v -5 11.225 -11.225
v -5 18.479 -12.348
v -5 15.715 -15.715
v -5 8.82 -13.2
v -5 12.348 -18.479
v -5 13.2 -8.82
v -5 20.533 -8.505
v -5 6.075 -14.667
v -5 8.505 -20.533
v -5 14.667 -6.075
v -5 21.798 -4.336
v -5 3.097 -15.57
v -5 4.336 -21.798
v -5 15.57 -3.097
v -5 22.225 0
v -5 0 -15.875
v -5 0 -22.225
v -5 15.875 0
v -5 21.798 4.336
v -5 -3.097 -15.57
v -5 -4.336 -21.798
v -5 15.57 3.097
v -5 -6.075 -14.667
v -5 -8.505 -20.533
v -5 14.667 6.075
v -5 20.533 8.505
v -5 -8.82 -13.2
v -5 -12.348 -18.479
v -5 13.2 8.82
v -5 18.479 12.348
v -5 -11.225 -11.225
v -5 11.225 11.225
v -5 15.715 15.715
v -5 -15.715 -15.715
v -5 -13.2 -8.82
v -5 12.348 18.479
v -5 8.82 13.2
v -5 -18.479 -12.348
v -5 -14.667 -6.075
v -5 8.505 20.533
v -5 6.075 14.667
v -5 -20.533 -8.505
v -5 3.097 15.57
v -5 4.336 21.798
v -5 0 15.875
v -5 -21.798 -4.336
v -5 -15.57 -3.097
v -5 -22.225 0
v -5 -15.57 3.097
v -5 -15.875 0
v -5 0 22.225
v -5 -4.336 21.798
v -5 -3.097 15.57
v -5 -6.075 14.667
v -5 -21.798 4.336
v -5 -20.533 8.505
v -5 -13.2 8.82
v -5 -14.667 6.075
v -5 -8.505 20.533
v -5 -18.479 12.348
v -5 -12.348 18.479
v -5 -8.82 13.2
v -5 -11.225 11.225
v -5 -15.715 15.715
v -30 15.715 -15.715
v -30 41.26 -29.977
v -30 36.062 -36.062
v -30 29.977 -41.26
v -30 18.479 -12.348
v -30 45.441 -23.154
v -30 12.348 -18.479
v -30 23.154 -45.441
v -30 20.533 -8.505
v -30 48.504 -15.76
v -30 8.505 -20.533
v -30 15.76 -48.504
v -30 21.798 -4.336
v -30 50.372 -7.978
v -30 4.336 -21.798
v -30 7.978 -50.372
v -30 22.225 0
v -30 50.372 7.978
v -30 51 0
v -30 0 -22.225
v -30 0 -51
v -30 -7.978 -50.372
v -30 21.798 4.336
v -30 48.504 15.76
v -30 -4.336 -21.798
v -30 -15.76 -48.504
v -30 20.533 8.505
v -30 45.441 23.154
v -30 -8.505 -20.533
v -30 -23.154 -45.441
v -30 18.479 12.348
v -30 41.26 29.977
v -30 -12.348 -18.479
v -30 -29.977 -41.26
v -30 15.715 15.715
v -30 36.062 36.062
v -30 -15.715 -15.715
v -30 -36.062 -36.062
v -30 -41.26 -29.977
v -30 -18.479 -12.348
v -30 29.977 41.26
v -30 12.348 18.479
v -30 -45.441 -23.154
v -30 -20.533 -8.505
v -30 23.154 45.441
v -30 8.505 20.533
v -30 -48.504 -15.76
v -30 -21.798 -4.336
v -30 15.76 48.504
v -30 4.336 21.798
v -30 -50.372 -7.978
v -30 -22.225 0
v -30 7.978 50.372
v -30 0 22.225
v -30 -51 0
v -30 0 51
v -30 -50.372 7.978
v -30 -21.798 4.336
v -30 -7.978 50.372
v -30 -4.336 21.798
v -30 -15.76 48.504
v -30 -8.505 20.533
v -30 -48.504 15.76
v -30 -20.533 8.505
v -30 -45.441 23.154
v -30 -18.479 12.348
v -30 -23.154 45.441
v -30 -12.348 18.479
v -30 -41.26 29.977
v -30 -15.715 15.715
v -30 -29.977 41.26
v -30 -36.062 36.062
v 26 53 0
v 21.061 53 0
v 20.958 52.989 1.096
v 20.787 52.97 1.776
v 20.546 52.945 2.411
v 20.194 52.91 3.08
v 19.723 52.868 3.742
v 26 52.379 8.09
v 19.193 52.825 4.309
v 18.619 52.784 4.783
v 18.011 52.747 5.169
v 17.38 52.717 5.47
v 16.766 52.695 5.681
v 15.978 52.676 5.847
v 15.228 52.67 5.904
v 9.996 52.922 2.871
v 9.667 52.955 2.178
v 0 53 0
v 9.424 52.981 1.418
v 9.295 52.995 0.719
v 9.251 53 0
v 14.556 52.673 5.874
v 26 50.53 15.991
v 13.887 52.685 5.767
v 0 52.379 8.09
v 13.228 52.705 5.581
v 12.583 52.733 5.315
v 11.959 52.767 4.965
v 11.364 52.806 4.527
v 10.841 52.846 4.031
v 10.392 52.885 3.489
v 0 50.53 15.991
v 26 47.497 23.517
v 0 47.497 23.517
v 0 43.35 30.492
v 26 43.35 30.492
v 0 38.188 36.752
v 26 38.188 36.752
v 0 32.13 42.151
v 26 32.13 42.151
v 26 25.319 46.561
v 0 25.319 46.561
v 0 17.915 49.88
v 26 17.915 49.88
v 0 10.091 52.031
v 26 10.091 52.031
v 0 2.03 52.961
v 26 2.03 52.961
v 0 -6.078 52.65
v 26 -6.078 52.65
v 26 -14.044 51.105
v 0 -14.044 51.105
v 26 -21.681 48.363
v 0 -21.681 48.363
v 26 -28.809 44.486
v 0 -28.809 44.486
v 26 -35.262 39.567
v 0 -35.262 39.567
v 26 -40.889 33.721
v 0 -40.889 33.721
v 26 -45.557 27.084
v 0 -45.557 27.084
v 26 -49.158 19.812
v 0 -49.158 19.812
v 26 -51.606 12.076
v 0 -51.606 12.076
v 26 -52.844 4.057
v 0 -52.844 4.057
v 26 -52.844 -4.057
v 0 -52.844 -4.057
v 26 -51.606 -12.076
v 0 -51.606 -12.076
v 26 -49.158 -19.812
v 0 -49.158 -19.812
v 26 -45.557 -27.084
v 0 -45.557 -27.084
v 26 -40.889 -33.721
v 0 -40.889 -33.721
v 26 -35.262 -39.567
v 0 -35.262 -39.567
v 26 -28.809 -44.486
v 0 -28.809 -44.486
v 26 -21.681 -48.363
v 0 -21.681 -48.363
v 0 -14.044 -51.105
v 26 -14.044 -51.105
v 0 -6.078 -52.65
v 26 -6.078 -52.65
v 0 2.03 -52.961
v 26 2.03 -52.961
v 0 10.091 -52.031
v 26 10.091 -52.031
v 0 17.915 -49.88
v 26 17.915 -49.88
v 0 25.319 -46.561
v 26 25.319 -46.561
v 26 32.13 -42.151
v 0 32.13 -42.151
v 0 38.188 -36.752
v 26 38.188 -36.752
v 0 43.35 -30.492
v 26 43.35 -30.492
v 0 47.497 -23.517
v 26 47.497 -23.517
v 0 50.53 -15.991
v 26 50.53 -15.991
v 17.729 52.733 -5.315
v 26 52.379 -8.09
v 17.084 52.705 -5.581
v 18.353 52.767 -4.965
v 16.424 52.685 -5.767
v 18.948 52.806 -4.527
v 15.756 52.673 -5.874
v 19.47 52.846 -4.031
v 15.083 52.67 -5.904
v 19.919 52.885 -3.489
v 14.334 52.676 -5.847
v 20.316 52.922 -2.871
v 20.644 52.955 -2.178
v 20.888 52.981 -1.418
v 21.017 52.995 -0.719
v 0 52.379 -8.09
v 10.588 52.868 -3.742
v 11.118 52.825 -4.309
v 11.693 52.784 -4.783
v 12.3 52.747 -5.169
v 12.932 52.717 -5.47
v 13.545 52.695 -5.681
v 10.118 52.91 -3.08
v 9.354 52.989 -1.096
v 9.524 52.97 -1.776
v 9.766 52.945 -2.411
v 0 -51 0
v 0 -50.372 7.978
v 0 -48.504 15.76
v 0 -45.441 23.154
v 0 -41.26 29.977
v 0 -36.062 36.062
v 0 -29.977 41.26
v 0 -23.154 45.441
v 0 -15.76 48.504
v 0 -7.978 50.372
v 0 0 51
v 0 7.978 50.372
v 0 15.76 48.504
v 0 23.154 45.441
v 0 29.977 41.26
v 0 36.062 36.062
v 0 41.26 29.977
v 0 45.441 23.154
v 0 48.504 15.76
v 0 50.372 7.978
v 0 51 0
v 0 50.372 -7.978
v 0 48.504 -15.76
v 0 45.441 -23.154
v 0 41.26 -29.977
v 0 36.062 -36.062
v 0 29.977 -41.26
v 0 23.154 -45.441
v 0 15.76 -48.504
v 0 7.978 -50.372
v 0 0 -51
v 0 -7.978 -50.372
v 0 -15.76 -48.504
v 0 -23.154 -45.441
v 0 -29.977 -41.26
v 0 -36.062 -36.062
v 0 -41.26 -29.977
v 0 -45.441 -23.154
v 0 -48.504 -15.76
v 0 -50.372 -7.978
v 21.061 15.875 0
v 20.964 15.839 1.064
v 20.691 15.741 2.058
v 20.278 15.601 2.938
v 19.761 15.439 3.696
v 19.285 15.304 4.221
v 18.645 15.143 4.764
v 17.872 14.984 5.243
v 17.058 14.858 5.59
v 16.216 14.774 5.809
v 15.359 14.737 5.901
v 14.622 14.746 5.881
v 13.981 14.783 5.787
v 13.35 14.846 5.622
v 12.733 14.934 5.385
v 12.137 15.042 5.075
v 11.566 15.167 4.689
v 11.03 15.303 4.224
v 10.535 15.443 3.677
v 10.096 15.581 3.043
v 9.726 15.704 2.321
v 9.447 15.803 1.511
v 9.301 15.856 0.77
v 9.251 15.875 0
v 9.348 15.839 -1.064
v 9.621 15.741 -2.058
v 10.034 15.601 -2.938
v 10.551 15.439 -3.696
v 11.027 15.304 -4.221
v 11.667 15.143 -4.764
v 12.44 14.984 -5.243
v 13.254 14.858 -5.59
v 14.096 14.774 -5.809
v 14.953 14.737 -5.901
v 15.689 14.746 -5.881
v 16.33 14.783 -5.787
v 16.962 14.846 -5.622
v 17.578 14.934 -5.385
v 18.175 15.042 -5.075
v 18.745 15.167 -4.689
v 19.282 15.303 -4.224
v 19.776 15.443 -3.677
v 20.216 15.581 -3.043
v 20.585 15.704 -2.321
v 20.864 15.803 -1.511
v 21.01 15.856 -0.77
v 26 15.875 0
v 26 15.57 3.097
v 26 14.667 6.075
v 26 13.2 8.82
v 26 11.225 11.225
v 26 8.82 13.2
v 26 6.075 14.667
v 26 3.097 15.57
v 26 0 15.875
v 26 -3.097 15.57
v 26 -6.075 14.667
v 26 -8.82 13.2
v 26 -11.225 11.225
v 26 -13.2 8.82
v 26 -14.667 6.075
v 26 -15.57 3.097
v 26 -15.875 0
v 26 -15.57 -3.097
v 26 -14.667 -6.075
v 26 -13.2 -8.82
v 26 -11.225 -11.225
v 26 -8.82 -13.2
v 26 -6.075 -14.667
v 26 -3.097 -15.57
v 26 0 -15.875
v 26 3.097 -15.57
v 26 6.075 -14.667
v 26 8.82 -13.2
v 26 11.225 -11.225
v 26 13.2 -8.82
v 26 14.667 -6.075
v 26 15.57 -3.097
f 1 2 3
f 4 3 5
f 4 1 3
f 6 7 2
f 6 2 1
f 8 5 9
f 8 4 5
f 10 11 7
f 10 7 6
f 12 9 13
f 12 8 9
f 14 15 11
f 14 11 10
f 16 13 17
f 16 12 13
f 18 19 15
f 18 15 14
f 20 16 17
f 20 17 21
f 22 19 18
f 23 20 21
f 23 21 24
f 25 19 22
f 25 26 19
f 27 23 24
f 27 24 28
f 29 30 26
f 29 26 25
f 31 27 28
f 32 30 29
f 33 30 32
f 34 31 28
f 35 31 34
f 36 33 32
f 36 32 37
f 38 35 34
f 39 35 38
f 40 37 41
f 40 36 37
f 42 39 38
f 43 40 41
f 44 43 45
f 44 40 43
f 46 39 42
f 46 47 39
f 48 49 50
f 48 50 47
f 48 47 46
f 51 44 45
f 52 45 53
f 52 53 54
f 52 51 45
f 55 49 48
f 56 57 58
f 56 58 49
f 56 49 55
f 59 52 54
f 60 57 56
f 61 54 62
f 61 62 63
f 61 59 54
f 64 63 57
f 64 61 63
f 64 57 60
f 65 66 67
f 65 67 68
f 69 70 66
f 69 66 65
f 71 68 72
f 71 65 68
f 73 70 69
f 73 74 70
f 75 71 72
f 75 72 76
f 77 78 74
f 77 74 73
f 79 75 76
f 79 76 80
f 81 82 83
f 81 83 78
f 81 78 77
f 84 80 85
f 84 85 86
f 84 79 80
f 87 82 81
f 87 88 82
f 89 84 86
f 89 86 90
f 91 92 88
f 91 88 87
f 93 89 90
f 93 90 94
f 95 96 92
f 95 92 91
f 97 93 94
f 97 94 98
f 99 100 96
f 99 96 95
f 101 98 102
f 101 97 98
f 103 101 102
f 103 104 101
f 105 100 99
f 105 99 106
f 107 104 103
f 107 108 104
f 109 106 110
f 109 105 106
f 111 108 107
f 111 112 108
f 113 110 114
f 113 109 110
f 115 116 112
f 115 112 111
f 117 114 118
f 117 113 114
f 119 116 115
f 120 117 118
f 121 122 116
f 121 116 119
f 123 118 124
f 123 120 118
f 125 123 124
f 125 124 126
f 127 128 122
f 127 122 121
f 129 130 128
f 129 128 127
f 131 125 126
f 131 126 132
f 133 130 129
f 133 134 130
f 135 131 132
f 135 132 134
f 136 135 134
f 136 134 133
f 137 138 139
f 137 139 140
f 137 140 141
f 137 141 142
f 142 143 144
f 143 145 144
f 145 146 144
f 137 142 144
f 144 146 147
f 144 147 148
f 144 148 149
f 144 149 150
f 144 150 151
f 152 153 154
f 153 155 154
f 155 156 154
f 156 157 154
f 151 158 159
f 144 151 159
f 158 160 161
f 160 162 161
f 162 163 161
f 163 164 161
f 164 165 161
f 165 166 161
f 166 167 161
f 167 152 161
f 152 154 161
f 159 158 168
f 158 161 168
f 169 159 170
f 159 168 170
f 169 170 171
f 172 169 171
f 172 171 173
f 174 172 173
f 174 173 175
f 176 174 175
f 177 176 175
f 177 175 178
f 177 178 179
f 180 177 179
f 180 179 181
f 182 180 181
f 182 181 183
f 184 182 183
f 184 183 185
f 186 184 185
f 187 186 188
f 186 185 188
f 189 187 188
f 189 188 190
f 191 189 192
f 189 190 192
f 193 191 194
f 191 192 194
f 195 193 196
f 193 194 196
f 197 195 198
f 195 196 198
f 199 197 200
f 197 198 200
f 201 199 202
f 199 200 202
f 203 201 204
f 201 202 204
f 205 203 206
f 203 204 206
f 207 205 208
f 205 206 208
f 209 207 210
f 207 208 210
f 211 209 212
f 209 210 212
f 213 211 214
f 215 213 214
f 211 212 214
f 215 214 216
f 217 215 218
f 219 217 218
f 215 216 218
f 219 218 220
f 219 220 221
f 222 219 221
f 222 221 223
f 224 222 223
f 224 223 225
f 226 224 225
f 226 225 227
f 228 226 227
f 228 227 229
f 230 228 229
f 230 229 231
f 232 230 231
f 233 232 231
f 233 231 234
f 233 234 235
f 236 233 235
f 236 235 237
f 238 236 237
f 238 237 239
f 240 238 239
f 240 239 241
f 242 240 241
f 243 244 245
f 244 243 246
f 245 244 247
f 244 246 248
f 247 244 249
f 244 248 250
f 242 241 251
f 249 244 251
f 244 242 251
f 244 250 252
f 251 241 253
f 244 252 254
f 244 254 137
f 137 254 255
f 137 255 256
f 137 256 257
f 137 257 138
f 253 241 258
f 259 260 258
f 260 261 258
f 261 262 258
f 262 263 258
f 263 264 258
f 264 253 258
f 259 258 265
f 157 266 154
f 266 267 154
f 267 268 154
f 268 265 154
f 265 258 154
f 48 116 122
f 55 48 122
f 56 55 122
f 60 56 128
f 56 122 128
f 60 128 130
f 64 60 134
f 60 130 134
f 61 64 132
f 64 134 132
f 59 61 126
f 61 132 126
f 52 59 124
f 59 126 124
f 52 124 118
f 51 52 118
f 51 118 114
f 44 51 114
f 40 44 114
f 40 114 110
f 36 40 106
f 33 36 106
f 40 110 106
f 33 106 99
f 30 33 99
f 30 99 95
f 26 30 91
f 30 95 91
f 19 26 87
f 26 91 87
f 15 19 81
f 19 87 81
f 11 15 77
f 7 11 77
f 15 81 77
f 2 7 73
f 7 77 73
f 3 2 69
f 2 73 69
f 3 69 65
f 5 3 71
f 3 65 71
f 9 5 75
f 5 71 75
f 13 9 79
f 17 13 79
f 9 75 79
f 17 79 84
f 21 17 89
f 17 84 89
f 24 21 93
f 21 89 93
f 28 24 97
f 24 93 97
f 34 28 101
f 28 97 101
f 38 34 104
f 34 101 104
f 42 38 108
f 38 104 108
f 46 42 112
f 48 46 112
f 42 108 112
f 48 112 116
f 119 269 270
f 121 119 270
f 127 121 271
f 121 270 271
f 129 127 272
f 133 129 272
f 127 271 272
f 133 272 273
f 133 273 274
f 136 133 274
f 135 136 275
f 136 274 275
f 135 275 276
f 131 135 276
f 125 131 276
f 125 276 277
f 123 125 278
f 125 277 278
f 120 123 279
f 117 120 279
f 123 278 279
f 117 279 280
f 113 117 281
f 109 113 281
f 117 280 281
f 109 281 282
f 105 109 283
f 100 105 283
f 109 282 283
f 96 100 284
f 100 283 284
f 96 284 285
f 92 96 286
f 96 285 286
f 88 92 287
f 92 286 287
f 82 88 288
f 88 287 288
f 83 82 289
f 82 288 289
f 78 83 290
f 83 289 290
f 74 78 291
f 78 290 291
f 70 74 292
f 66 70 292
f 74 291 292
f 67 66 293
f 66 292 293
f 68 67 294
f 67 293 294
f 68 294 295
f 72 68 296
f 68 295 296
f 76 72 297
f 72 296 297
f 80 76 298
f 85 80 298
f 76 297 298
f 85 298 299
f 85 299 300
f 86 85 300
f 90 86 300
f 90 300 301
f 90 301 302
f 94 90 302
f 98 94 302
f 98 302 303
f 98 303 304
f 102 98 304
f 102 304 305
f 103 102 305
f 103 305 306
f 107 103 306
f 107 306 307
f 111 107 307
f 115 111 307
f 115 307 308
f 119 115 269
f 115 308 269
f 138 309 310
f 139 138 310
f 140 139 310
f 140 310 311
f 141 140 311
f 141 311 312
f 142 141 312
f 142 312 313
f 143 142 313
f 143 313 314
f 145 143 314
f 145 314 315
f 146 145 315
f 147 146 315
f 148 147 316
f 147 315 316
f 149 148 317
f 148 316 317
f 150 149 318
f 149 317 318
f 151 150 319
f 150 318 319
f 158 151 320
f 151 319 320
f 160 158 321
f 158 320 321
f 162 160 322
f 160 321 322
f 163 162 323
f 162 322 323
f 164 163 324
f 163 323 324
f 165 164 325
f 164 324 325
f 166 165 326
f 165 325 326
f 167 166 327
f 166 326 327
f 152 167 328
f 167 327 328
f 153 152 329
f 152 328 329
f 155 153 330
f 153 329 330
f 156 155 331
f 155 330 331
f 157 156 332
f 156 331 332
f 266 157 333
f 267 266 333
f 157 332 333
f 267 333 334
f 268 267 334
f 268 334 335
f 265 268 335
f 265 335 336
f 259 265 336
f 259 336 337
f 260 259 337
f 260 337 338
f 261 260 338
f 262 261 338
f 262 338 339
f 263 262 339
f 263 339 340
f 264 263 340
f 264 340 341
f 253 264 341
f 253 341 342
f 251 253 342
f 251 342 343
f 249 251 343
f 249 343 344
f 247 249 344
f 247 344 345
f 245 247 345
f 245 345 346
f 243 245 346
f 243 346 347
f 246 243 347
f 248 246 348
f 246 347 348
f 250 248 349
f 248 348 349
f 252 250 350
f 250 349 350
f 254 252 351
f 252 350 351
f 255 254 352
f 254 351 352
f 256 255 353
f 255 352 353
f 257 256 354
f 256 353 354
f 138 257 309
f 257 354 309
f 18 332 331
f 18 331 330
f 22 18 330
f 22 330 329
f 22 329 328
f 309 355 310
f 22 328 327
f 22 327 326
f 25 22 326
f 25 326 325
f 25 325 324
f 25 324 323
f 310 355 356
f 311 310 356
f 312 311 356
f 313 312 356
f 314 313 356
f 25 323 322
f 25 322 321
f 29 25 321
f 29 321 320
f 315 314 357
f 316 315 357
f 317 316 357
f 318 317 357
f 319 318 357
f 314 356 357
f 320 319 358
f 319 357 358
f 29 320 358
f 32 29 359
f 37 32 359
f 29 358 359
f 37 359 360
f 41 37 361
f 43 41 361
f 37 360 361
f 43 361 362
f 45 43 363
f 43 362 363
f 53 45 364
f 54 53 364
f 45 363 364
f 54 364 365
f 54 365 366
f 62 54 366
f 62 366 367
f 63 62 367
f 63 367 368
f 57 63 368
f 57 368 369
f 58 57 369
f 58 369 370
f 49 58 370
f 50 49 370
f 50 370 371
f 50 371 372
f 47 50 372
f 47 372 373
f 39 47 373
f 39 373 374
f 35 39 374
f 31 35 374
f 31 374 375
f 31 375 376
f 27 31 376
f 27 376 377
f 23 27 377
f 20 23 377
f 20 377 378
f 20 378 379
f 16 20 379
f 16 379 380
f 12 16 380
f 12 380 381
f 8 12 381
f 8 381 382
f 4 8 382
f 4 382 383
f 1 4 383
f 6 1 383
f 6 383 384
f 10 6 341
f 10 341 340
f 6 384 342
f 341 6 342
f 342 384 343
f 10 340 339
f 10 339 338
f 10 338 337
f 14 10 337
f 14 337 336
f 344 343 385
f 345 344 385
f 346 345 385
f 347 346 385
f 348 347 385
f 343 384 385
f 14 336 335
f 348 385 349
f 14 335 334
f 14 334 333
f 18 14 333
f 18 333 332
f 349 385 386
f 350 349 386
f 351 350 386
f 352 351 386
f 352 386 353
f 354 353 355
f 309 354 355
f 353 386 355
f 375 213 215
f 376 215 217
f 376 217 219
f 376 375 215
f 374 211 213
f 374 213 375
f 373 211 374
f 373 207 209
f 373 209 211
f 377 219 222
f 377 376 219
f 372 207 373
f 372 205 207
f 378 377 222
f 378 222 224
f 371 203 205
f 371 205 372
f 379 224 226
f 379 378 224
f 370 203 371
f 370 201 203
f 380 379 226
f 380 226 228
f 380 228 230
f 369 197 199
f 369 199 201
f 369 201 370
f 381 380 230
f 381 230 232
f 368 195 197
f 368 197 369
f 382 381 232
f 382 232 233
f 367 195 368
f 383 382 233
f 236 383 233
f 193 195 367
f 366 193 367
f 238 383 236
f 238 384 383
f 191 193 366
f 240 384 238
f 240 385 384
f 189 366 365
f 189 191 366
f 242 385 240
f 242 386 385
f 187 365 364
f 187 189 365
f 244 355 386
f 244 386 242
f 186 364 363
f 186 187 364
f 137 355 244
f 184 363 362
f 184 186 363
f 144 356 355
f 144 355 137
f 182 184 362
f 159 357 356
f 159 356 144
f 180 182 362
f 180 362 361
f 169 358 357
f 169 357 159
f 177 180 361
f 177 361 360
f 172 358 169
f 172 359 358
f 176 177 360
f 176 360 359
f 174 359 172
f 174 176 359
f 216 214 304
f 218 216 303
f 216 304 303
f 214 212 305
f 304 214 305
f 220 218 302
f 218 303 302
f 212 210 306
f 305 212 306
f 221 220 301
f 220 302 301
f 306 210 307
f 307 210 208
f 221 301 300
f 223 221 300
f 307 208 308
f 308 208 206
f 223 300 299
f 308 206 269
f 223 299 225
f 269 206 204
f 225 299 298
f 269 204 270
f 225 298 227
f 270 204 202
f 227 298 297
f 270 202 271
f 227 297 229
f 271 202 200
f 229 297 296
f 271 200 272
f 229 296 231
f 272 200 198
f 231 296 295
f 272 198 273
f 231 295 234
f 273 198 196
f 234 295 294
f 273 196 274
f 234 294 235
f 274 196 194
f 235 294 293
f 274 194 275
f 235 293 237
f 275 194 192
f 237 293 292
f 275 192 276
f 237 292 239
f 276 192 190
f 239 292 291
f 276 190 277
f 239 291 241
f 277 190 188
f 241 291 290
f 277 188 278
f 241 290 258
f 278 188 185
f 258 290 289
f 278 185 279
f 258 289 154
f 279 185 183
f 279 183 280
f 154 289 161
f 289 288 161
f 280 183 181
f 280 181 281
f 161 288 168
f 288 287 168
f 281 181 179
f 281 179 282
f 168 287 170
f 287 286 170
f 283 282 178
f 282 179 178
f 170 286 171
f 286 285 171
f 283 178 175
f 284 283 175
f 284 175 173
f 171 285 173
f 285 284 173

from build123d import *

# Parameters (mm, degrees)
F0_R      = 53
F1_DEPTH  = 26
F2_R      = 51
F3_DEPTH  = 30
F6_R      = 22.225
F7_DEPTH  = 25
F4_R      = 15.875
F8_DEPTH  = 31
F7_FACE_R = 22.225
F9_DEPTH  = 25
F10_R     = 22.225
F11_DEPTH = 25
F12_R     = 5.904872
F13_DEPTH = 57


with BuildPart() as f1:
    # F0 (on Right) → F1 (new body)
    with BuildSketch(Plane.YZ):
        Circle(F0_R)
    extrude(amount=F1_DEPTH)

    # F2 (on face) → F3 (join)
    with BuildSketch(Plane(origin=(0, 0, 0), x_dir=(0, -1, 0), z_dir=(-1, 0, 0))):
        Circle(F2_R)
    extrude(amount=F3_DEPTH)

    # F6 (on face) → F7 (join)
    with BuildSketch(Plane(origin=(-30, 0, 0), x_dir=(0, -1, 0), z_dir=(-1, 0, 0))):
        Circle(F6_R)
    extrude(amount=F7_DEPTH)

    # F4 (on face) → F8 (cut)
    with BuildSketch(Plane.YZ.offset(26)):
        Circle(F4_R)
    extrude(amount=-F8_DEPTH, mode=Mode.SUBTRACT)

    # F7_face (on face) → F9 (cut)
    with BuildSketch(Plane(origin=(-55, 0, 0), x_dir=(0, -1, 0), z_dir=(-1, 0, 0))):
        Circle(F7_FACE_R)
    extrude(amount=-F9_DEPTH, mode=Mode.SUBTRACT)

    # F10 (on face) → F11 (cut)
    with BuildSketch(Plane(origin=(-30, 0, 0), x_dir=(0, -1, 0), z_dir=(-1, 0, 0))):
        Circle(F10_R)
    extrude(amount=-F11_DEPTH, mode=Mode.SUBTRACT)

    # F12 (on Front) → F13 (cut)
    with BuildSketch(Plane.XZ):
        with Locations((15.155762, 0)):
            Circle(F12_R)
    extrude(amount=-F13_DEPTH, mode=Mode.SUBTRACT)


solid = f1.part
